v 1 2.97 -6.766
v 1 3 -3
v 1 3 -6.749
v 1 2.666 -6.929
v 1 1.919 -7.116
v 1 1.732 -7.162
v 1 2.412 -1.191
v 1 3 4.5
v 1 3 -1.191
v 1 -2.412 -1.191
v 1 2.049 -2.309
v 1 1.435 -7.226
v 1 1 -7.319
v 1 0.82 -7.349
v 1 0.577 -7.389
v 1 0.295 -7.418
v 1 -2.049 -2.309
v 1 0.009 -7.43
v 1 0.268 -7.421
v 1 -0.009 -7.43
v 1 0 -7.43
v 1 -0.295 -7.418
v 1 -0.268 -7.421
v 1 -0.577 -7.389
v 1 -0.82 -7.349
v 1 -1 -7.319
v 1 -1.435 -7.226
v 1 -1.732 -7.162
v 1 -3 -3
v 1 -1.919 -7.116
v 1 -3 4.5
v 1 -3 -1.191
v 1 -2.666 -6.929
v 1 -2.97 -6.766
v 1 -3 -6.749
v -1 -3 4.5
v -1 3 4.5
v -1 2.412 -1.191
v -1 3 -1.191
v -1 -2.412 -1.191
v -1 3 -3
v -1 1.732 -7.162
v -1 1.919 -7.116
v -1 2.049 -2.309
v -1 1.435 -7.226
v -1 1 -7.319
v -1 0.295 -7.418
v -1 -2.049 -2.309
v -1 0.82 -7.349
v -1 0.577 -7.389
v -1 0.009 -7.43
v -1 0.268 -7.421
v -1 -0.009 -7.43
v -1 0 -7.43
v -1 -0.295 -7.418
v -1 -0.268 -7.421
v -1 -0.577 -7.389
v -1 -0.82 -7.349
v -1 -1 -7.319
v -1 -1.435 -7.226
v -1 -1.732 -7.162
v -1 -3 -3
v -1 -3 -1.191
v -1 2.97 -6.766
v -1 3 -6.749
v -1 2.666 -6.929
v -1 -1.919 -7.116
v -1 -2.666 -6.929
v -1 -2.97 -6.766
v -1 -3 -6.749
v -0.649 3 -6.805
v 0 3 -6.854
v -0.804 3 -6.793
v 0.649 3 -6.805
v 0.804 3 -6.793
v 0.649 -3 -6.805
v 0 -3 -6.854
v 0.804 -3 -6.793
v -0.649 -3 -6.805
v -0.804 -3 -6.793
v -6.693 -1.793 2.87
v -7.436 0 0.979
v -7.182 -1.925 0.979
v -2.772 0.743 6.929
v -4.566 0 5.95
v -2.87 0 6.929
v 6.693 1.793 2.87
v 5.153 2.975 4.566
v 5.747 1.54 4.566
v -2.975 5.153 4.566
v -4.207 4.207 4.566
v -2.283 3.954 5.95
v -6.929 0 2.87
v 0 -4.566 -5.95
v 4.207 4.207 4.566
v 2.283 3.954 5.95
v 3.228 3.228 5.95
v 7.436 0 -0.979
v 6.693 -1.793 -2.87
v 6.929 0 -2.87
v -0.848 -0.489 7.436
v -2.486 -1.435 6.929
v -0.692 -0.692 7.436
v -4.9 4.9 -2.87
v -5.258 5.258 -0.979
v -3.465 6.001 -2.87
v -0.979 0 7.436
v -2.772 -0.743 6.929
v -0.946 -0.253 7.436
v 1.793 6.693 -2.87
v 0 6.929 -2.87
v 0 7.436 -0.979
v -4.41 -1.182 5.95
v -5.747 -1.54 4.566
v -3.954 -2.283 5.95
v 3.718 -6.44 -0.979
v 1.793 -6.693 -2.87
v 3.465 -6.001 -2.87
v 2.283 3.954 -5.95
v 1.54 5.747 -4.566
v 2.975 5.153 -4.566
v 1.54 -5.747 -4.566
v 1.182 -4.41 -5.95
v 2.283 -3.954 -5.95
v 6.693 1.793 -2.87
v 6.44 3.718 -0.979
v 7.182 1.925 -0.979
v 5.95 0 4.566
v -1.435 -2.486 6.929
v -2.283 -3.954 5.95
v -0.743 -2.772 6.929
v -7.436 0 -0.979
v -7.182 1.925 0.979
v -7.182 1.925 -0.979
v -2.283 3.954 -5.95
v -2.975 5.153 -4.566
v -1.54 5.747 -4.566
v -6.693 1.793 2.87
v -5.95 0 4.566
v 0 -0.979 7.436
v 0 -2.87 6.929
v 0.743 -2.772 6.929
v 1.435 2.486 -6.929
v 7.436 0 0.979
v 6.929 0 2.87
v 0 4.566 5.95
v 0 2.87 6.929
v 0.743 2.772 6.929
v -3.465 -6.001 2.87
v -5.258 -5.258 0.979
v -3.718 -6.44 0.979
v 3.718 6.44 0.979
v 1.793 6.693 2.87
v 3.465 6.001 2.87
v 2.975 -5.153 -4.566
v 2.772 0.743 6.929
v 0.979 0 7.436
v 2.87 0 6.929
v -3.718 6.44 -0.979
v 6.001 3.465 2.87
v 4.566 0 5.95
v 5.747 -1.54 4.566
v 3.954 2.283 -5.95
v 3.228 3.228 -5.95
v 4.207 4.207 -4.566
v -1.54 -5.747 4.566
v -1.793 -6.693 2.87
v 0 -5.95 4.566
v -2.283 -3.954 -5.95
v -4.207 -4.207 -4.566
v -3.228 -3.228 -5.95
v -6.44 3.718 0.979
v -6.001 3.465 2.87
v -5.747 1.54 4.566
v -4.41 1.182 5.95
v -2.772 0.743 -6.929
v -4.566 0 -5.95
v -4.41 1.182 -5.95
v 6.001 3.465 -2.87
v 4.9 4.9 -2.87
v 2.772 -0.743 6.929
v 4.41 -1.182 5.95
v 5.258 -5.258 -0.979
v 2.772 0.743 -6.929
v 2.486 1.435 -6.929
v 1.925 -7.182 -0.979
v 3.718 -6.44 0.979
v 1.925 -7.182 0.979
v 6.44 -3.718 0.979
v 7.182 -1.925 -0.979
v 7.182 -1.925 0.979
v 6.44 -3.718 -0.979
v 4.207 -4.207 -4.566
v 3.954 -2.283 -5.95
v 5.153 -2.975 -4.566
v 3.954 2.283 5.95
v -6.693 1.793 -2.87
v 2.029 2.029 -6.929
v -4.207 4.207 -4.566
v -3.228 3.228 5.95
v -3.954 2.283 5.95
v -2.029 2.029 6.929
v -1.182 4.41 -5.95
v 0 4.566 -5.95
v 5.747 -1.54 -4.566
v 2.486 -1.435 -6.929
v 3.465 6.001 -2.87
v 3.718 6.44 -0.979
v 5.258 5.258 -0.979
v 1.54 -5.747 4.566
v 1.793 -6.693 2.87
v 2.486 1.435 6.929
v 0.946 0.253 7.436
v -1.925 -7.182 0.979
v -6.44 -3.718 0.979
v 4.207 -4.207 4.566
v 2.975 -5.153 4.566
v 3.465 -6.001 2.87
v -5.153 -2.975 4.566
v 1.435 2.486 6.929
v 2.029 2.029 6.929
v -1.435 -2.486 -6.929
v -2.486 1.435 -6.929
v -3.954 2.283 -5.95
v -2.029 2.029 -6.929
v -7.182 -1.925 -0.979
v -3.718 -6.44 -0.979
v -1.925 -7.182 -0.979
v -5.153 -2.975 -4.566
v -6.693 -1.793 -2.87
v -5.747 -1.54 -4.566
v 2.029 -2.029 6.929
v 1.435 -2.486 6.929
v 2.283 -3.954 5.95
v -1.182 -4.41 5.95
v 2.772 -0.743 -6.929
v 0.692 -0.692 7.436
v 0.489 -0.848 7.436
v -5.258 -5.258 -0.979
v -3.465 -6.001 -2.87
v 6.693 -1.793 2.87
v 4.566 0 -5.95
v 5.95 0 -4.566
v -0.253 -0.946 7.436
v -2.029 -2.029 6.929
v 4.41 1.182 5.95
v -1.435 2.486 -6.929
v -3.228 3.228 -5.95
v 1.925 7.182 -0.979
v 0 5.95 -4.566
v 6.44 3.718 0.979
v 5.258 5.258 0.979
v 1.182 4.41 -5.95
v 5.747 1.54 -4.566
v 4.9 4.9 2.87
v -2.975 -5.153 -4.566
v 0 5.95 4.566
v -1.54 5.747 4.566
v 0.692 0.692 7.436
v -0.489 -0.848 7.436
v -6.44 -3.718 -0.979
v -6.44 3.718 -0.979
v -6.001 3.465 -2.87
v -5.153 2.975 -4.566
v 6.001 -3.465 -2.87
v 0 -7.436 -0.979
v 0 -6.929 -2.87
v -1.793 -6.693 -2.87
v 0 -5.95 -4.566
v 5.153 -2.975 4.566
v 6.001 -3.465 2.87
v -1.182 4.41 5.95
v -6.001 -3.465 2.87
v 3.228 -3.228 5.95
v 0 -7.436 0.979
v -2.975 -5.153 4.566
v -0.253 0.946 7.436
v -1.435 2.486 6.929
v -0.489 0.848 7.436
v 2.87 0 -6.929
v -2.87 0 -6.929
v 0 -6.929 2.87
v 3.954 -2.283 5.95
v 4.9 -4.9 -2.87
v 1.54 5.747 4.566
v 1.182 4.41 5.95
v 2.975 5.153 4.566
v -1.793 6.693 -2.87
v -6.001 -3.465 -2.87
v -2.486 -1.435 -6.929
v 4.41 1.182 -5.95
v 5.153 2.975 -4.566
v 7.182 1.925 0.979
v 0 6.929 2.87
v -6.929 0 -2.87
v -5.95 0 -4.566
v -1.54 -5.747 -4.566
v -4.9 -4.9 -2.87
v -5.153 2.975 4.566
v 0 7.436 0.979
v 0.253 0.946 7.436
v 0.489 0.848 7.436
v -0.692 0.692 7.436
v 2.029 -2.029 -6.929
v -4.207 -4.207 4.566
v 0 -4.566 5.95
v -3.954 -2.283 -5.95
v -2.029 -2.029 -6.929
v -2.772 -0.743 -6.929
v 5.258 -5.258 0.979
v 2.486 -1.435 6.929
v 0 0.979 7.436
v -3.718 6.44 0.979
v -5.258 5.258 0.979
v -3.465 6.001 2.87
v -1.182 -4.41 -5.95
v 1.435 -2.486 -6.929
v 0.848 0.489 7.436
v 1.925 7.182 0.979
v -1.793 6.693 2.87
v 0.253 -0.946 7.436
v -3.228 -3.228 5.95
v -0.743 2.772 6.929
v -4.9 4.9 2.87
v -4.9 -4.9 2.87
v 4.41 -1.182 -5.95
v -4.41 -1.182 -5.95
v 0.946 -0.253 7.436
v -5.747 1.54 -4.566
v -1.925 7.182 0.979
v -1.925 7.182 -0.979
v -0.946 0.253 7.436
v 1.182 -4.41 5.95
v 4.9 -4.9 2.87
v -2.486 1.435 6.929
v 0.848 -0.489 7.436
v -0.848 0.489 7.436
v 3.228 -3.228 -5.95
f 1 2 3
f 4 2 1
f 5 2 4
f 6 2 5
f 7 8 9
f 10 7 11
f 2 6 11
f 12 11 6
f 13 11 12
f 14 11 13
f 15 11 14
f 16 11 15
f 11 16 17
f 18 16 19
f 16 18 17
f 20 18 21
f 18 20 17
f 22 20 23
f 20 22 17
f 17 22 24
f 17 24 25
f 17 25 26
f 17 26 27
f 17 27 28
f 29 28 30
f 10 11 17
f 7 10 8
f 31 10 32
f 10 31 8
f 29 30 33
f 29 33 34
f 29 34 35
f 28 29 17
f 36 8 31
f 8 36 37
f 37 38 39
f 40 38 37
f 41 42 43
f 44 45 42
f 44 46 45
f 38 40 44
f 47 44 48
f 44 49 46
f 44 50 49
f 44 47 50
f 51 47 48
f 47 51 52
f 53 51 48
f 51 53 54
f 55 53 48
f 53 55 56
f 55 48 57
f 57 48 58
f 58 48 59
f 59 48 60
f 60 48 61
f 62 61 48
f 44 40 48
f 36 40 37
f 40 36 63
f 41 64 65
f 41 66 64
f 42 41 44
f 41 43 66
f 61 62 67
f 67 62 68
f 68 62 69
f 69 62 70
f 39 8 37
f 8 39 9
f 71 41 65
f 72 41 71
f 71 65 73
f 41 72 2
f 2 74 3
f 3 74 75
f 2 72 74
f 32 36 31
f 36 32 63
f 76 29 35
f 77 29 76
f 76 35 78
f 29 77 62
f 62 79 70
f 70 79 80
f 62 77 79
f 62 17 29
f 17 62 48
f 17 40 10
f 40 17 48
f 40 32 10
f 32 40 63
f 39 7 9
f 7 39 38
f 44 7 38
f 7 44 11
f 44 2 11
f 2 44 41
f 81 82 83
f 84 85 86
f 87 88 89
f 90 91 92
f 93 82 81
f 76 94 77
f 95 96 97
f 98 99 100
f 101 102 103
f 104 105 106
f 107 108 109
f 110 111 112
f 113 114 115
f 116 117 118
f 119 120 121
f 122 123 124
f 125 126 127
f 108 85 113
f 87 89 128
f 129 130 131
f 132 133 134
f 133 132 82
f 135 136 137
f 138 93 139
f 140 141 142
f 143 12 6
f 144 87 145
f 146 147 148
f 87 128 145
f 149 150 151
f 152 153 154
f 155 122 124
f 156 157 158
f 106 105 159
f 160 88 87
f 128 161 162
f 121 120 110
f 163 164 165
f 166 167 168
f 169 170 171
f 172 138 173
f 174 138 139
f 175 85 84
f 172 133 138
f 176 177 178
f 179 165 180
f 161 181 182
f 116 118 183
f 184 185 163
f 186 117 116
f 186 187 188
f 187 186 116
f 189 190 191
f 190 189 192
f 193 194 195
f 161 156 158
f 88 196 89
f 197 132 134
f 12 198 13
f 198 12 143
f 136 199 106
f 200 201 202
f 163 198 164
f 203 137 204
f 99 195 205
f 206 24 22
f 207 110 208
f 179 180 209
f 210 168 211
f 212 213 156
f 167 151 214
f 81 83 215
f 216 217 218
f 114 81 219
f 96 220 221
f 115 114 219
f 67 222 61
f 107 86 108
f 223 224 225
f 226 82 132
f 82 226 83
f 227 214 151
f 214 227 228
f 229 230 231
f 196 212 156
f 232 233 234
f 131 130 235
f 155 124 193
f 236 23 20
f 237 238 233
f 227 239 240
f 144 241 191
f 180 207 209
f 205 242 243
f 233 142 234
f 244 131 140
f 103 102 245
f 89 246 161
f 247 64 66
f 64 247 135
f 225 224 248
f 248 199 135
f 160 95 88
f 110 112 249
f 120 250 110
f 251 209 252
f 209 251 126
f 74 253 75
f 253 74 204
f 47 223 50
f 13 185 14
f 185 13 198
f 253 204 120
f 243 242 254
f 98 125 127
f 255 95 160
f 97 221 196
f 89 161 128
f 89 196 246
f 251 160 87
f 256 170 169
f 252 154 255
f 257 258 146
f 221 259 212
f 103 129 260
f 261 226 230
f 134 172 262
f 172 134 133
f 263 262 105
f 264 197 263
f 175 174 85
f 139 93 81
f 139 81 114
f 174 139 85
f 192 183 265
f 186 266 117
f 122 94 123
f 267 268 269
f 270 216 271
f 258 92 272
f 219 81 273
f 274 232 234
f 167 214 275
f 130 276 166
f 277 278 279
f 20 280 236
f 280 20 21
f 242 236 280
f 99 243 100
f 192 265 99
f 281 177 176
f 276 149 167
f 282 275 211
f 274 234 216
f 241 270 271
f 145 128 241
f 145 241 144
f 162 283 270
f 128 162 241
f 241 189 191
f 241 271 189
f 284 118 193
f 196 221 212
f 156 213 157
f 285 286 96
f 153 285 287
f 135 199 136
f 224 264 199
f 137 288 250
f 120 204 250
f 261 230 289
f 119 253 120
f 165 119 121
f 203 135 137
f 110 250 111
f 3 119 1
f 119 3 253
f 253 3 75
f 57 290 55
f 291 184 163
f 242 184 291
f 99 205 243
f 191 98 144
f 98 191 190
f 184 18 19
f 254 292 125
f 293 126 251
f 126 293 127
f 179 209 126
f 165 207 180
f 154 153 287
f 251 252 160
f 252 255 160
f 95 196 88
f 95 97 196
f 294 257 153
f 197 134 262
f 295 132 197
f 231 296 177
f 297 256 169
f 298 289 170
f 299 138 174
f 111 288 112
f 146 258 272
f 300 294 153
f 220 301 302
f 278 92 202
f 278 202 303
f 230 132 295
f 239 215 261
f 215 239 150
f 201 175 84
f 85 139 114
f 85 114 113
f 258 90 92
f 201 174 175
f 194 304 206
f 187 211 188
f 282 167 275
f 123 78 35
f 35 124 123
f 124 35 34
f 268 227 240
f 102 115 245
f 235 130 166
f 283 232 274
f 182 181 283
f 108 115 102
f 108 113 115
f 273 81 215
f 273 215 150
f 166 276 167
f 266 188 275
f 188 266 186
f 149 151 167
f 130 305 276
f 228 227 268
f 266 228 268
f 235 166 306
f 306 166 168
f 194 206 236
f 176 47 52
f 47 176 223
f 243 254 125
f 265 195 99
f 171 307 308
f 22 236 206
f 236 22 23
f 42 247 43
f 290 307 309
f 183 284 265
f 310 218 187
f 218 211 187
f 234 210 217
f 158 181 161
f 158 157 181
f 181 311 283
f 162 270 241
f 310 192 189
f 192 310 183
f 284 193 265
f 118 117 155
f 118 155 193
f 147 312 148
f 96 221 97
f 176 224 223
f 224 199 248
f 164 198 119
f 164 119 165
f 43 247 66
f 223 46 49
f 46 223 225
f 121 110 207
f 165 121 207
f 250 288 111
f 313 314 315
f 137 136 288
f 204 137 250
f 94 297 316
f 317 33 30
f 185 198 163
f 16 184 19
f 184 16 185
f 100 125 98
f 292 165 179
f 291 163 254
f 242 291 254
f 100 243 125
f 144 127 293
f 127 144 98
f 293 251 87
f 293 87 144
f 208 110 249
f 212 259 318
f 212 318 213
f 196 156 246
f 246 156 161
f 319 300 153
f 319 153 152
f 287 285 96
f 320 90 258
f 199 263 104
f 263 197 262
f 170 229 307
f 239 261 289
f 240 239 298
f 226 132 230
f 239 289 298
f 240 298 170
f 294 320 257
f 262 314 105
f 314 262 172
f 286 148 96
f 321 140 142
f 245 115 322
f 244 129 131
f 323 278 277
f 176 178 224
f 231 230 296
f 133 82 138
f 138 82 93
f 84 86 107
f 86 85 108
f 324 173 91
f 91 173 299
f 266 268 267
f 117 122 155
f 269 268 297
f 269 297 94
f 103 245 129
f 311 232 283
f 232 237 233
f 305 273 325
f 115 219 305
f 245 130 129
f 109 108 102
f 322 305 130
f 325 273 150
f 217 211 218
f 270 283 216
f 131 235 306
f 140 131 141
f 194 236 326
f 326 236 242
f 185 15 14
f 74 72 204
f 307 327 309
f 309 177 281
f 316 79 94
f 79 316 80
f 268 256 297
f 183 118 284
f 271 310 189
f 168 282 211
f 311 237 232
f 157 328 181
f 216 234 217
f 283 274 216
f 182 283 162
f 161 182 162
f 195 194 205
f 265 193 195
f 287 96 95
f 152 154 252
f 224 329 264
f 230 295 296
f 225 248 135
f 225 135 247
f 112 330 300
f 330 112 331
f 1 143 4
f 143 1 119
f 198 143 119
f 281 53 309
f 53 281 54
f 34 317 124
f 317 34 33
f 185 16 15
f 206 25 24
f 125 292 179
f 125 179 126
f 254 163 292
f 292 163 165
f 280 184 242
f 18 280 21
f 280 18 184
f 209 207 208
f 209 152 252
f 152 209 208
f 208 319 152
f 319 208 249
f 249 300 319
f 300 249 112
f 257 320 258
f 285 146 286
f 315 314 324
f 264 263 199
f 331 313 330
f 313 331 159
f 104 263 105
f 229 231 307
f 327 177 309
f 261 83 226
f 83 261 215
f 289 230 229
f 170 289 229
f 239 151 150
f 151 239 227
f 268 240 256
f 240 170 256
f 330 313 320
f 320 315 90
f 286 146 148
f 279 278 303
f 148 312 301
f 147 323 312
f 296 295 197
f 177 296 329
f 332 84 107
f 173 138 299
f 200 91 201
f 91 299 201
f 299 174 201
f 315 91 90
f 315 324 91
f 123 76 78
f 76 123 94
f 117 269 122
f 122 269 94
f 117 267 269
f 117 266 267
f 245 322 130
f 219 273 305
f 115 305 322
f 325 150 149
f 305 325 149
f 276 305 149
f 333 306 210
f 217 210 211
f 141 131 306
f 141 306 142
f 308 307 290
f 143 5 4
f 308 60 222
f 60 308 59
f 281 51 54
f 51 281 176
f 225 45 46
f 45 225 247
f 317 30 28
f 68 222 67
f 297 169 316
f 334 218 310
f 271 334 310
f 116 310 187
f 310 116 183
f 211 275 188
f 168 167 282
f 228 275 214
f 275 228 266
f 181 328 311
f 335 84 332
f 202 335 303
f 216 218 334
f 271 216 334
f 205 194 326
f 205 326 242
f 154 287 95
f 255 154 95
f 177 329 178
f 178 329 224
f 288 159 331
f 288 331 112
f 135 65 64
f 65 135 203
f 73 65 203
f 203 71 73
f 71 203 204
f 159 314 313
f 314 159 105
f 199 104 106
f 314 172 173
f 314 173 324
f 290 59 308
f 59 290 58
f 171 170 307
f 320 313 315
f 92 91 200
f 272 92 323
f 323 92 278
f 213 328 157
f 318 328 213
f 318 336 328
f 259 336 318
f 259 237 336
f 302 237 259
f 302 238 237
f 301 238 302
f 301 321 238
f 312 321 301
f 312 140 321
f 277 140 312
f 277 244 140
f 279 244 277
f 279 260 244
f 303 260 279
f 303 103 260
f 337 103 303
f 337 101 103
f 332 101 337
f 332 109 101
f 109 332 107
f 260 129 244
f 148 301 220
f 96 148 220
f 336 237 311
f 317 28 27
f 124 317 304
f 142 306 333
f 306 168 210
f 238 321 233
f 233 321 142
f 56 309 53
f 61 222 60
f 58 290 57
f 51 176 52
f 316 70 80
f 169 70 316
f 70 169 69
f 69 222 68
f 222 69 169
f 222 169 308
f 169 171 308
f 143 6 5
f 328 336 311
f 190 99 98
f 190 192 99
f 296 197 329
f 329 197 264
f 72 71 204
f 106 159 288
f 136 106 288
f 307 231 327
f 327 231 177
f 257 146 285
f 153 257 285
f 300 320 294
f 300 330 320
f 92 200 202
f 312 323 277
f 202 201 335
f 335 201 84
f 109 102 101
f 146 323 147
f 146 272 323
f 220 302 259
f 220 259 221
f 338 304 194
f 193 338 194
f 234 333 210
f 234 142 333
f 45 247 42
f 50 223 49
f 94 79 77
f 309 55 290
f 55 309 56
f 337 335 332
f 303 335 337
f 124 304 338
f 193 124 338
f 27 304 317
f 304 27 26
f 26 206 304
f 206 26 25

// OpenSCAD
// make a slider

pw = 2; //mm width of prong
ph = 6; //mm height of prong
pd = 12; //mm depth of prong into button
dd = 6.5; // mm depth of'dents' from end of prong
bw = 46; //mm width of button
bh = 15; //mm height of button

// To Do:
// draw knob
// shape 1 is a "cube"
// shape 2 is a cylinder
// shape 3 is a sphere

module knob(shape) {

if (shape == 1) {
// square button
cube([bw, bh, bh], center=true);
}

if (shape == 2) {
// cylinder button
rotate([0,90,0]) cylinder(r=bh/2, h=bw, center=true);
}

if (shape == 3) {
sphere(r=bh/2);
}

// add label to button
}

module prong() {
translate([0,0,0-(bh-pd)/2]) {
difference() {
cube(size=[pw, ph, pd], center=true);
// snaps
translate ([-0.1,0-ph/2,pd/2-dd]) rotate ([0,90,0]) cylinder(h=ph+0.2, r=1, center=true);
translate ([-0.1,ph/2,pd/2-dd]) rotate ([0,90,0]) cylinder(h=ph+0.2, r=1, center=true);}
}
}

module d_knob(shape) {
difference() {
knob(shape);
#prong();
}
}

d_knob(3);
//prong();
